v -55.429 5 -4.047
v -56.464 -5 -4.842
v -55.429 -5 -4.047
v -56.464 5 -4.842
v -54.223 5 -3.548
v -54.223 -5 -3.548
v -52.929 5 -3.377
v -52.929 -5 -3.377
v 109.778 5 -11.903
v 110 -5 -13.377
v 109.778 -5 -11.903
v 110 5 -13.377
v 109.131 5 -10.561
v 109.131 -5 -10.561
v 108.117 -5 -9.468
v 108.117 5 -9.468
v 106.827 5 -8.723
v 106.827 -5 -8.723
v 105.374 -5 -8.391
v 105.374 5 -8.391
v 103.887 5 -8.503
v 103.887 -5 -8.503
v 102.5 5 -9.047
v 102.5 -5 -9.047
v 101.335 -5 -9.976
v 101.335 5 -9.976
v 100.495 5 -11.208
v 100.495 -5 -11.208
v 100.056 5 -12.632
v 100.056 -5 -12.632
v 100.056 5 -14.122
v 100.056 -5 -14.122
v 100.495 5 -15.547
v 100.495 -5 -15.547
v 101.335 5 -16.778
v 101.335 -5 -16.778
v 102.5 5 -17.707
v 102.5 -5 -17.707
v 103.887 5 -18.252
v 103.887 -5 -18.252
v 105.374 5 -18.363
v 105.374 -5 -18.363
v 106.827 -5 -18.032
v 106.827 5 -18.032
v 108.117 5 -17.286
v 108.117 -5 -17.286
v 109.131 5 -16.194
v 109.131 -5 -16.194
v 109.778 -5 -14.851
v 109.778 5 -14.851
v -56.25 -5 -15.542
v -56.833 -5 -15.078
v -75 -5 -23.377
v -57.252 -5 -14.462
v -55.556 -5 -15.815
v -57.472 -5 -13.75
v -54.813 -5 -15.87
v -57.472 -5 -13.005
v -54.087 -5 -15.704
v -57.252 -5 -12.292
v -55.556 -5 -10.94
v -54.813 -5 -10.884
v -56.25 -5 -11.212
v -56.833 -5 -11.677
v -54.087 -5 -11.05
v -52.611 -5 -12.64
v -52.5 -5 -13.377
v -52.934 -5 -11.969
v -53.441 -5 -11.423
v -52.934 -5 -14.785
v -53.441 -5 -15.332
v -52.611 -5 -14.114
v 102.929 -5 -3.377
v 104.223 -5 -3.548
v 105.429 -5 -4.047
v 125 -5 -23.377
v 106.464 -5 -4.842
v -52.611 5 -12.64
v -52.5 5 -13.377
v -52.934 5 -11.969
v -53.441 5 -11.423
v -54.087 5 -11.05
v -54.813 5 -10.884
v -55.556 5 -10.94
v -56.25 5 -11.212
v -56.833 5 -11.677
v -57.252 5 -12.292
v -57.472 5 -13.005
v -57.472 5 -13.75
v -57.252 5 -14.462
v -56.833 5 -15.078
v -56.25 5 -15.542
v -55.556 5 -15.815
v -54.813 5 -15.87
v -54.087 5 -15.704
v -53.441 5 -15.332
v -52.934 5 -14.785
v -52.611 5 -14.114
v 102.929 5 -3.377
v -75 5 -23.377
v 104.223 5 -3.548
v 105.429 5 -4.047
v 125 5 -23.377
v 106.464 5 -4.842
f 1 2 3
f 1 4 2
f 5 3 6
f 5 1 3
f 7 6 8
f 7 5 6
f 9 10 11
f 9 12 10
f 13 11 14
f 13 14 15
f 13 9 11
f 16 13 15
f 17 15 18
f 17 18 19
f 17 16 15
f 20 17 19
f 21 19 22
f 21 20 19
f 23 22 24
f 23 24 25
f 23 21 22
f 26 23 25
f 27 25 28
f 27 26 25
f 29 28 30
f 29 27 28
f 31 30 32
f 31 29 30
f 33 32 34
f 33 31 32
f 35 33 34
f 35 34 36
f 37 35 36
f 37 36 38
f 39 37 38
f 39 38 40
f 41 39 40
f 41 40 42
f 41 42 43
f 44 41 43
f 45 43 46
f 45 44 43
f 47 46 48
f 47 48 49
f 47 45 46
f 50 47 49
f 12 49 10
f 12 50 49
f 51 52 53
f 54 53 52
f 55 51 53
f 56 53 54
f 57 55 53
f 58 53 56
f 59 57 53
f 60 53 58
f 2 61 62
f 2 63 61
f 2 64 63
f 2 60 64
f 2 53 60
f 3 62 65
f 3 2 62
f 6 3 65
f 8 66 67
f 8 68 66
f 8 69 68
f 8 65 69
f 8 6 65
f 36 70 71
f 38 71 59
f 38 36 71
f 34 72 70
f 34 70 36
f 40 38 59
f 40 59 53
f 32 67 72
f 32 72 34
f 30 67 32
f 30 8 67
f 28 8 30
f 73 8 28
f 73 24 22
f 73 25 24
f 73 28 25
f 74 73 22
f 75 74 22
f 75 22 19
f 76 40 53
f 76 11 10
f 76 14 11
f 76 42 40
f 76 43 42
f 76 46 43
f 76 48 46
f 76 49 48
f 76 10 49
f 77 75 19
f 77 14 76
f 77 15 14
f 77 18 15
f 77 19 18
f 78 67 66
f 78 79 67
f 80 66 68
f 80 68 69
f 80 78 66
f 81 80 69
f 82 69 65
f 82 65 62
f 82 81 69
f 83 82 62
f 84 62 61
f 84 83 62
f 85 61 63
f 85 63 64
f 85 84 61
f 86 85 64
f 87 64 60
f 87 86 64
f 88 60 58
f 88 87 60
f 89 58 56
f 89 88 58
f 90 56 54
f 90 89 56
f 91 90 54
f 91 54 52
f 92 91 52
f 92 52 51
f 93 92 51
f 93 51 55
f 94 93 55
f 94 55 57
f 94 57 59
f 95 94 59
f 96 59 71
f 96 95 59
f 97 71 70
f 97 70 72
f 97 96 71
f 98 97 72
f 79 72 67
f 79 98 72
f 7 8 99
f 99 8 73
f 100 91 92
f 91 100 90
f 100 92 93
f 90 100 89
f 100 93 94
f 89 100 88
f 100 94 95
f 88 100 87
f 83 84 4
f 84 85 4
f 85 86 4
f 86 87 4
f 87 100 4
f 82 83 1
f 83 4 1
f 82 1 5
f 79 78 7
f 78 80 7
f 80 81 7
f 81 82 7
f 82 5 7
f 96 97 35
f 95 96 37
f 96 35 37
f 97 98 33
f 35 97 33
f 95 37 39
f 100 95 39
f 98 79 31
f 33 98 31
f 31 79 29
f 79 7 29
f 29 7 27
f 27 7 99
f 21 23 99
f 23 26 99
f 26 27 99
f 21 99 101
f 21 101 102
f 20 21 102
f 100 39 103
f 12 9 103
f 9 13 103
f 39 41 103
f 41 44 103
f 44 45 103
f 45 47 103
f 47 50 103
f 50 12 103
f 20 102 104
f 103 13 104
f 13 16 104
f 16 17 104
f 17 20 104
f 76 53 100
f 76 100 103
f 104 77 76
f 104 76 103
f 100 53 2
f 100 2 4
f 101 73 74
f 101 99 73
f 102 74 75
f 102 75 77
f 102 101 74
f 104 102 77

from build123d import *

# Parameters (mm, degrees)
F0_W     = 200
F0_H     = 20
F0_R     = 2.5
F0_R_2   = 5
F1_DEPTH = 5
F2_SIZE  = 19.99999
F3_R     = 5


# Not quite as in the source:
# - a fillet or chamfer is up to 0.001 mm smaller than in the source, because OpenCascade refuses the exact size


with BuildPart() as f1:
    # F0 (on Front) → F1 (new body, symmetric)
    with BuildSketch(Plane.XZ):
        with Locations((25, -13.3771840364)):
            Rectangle(F0_W, F0_H)
        with Locations((-55, -13.3771840364)):
            Circle(F0_R, mode=Mode.SUBTRACT)
        with Locations((105, -13.3771840364)):
            Circle(F0_R_2, mode=Mode.SUBTRACT)
    extrude(amount=F1_DEPTH, both=True)

    # F2 (size 20 in the source; OpenCascade refuses exactly that, so slightly less here)
    f2_edges = [f1.edges().sort_by_distance(p)[0] for p in [
        (-75, 0, -3.377184),
        (125, 0, -3.377184),
    ]]
    chamfer(f2_edges, length=F2_SIZE)

    # F3
    f3_edges = [f1.edges().sort_by_distance(p)[0] for p in [
        (-55.00001, 0, -3.377184),
        (105.00001, 0, -3.377184),
    ]]
    fillet(f3_edges, radius=F3_R)


solid = f1.part
